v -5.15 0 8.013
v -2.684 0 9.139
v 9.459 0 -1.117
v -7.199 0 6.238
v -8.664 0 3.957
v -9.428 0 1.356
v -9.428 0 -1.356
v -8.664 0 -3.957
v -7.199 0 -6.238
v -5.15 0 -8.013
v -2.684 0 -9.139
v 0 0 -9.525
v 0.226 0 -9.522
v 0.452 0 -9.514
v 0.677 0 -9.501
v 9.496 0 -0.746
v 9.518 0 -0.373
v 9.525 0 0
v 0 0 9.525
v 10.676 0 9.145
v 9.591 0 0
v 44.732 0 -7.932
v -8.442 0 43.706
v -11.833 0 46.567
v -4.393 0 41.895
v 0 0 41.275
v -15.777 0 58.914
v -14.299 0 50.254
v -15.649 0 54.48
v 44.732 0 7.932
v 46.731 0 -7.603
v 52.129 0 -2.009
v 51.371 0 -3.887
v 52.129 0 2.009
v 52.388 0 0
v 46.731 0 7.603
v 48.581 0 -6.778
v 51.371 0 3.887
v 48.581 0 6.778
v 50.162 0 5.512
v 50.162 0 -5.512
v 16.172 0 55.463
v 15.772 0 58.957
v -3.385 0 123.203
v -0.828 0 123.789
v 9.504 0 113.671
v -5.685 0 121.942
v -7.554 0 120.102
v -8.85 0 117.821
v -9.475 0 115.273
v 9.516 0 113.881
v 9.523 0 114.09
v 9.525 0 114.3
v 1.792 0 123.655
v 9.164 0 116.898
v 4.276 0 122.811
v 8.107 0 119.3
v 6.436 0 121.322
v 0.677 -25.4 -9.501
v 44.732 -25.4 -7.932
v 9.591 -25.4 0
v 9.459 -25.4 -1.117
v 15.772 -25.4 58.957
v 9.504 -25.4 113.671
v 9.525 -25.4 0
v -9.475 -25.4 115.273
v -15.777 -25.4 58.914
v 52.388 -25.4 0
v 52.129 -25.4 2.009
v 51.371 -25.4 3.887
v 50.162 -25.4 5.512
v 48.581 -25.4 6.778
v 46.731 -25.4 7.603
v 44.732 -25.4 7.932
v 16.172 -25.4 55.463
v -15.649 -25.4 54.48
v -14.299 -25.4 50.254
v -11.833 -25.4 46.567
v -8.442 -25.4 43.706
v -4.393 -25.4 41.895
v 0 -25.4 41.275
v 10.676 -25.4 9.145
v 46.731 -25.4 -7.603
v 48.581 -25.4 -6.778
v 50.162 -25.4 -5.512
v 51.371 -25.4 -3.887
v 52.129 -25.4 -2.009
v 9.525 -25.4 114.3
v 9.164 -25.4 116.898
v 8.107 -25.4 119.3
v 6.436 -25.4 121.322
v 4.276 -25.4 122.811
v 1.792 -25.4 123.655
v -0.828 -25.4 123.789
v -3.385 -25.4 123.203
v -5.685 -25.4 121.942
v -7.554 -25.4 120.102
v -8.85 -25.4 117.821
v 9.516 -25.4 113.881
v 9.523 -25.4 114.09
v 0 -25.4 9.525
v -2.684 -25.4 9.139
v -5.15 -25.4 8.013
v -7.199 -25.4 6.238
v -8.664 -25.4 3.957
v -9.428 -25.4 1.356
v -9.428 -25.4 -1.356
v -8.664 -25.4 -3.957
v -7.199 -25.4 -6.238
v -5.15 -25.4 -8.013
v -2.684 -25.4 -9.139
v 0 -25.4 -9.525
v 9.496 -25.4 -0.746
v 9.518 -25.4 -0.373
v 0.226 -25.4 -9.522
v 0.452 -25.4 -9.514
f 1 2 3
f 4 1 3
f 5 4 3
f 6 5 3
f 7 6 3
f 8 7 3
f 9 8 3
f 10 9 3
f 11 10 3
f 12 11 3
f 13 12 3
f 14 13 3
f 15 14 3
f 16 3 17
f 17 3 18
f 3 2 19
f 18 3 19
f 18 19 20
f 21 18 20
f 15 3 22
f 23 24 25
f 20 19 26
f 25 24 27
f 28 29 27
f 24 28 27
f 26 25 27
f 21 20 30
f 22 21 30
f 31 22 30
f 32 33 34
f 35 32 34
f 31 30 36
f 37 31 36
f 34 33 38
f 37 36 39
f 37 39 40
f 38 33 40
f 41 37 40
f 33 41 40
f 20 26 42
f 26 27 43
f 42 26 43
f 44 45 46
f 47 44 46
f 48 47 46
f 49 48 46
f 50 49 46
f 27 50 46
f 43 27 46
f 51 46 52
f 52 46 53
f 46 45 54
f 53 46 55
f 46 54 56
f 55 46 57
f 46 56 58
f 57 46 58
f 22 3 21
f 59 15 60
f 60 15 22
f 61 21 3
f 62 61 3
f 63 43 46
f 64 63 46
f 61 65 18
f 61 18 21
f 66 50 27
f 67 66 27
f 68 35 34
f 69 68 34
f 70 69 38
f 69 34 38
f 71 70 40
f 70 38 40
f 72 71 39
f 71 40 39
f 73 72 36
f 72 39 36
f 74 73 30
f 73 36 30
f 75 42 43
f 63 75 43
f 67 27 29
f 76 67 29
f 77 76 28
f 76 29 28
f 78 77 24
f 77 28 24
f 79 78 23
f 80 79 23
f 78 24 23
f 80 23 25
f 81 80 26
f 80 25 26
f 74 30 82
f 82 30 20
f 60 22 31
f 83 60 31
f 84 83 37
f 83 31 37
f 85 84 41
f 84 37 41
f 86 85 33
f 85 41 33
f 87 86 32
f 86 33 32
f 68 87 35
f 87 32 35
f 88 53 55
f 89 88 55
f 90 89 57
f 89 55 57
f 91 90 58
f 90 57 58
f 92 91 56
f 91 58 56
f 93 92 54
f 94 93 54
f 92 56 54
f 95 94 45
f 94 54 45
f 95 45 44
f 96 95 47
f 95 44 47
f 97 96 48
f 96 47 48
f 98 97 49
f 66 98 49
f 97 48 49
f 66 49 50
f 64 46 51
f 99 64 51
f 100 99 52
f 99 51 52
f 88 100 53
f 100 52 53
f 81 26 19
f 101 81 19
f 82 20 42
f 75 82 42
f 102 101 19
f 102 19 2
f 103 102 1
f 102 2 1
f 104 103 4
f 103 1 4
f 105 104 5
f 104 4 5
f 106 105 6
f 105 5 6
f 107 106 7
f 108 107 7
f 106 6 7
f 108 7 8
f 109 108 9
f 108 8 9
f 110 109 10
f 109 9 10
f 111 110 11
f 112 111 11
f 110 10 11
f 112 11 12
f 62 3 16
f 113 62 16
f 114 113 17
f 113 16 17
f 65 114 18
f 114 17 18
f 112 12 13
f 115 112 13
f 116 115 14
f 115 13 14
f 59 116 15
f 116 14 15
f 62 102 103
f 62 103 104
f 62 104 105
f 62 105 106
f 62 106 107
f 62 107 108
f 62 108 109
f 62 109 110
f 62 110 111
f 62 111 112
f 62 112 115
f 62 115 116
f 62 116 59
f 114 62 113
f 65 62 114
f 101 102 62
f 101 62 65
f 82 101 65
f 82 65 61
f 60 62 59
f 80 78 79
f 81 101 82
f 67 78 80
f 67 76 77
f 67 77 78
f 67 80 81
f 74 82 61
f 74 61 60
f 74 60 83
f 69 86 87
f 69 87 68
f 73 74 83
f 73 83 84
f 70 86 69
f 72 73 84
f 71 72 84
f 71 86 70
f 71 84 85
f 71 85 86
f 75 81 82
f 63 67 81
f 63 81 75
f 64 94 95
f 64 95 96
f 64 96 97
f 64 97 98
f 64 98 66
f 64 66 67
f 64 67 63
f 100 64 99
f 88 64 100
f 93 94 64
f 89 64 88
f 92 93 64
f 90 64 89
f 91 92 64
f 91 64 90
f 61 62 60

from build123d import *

# Parameters (mm, degrees)
F1_DEPTH = 25.4
F2_DEPTH = 25.4


with BuildPart() as f1:
    # F0 (on Front) → F1 (new body)
    with BuildSketch(Plane.XZ):
        with BuildLine():
            Line((0, 0), (0, 9.525))
            ThreePointArc((0, 9.525), (-9.525, 0), (0, -9.525))
            Line((0, -9.525), (0.6773435479, -9.500885786))
            ThreePointArc((0.6773435479, -9.500885786), (6.5771572573, -6.8896028487), (9.4592491619, -1.117242271))
            ThreePointArc((9.4592491619, -1.117242271), (9.5085480823, -0.5595876752), (9.525, 0))
            Line((9.525, 0), (0, 0))
        make_face()
        with BuildLine():
            Line((0, 41.275), (0, 9.525))
            ThreePointArc((0, 9.525), (0.3388863295, 9.5189695375), (0.6773435479, 9.500885786))
            Line((0.6773435479, 9.500885786), (10.676261341, 9.1449127433))
            Line((10.676261341, 9.1449127433), (16.1720081428, 55.4634825416))
            Line((16.1720081428, 55.4634825416), (15.771858623, 58.9566822016))
            ThreePointArc((15.771858623, 58.9566822016), (15.8491936804, 58.0548119585), (15.875, 57.15))
            ThreePointArc((15.875, 57.15), (11.2253201513, 45.9246798487), (0, 41.275))
        make_face()
        with BuildLine():
            Line((0.6773435479, 9.500885786), (0, 9.525))
            Line((0, 9.525), (0, 0))
            Line((0, 0), (9.525, 0))
            ThreePointArc((9.525, 0), (6.9705567315, 6.4912990883), (0.6773435479, 9.500885786))
        make_face()
        with BuildLine():
            ThreePointArc((0.6773435479, 9.500885786), (0.3388863295, 9.5189695375), (0, 9.525))
            Line((0, 9.525), (0.6773435479, 9.500885786))
        make_face()
        with BuildLine():
            Line((0.6773435479, -9.500885786), (0, -9.525))
            ThreePointArc((0, -9.525), (0.3388863295, -9.5189695375), (0.6773435479, -9.500885786))
        make_face()
        with BuildLine():
            Line((10.676261341, 9.1449127433), (0.6773435479, 9.500885786))
            ThreePointArc((0.6773435479, 9.500885786), (6.9705567315, 6.4912990883), (9.525, 0))
            Line((9.525, 0), (9.5912078693, 0))
            Line((9.5912078693, 0), (10.676261341, 9.1449127433))
        make_face()
        with BuildLine():
            Line((0, 73.025), (0, 41.275))
            ThreePointArc((0, 41.275), (11.2253201513, 45.9246798487), (15.875, 57.15))
            ThreePointArc((15.875, 57.15), (15.8491936804, 58.0548119585), (15.771858623, 58.9566822016))
            ThreePointArc((15.771858623, 58.9566822016), (10.5672736562, 68.9968709993), (0, 73.025))
        make_face()
        with BuildLine():
            ThreePointArc((-15.7766896907, 58.9139975635), (-11.8325628315, 46.5667074197), (0, 41.275))
            Line((0, 41.275), (0, 73.025))
            ThreePointArc((0, 73.025), (-10.5832925803, 68.9825628315), (-15.7766896907, 58.9139975635))
        make_face()
        with BuildLine():
            ThreePointArc((9.4592491619, -1.117242271), (6.5771572573, -6.8896028487), (0.6773435479, -9.500885786))
            Line((0.6773435479, -9.500885786), (44.7324052746, -7.9324746146))
            ThreePointArc((44.7324052746, -7.9324746146), (38.9380895153, -5.7116327839), (36.5125, 0))
            Line((36.5125, 0), (9.5912078693, 0))
            Line((9.5912078693, 0), (9.4592491619, -1.117242271))
        make_face()
        with BuildLine():
            Line((44.7324052746, 7.9324746146), (10.676261341, 9.1449127433))
            Line((10.676261341, 9.1449127433), (9.5912078693, 0))
            Line((9.5912078693, 0), (36.5125, 0))
            ThreePointArc((36.5125, 0), (38.9380895153, 5.7116327839), (44.7324052746, 7.9324746146))
        make_face()
        with BuildLine():
            Line((-9.4751940083, 115.2727916044), (-15.7766896907, 58.9139975635))
            ThreePointArc((-15.7766896907, 58.9139975635), (-10.5832925803, 68.9825628315), (0, 73.025))
            Line((0, 73.025), (0, 104.775))
            ThreePointArc((0, 104.775), (-7.0707660487, 107.9180024691), (-9.4751940083, 115.2727916044))
        make_face()
        with BuildLine():
            Line((0, 104.775), (0, 73.025))
            ThreePointArc((0, 73.025), (10.5672736562, 68.9968709993), (15.771858623, 58.9566822016))
            Line((15.771858623, 58.9566822016), (9.5042343668, 113.6713871614))
            ThreePointArc((9.5042343668, 113.6713871614), (6.5091507784, 107.3461103587), (0, 104.775))
        make_face()
        with BuildLine():
            ThreePointArc((36.5125, 0), (38.9380895153, -5.7116327839), (44.7324052746, -7.9324746146))
            ThreePointArc((44.7324052746, -7.9324746146), (50.1616327839, -5.5119104847), (52.3875, 0))
            ThreePointArc((52.3875, 0), (50.1616327839, 5.5119104847), (44.7324052746, 7.9324746146))
            ThreePointArc((44.7324052746, 7.9324746146), (38.9380895153, 5.7116327839), (36.5125, 0))
        make_face()
        with BuildLine():
            ThreePointArc((9.525, 114.3), (0.4870328896, 123.8125403528), (-9.4751940083, 115.2727916044))
            ThreePointArc((-9.4751940083, 115.2727916044), (-7.0707660487, 107.9180024691), (0, 104.775))
            ThreePointArc((0, 104.775), (6.5091507784, 107.3461103587), (9.5042343668, 113.6713871614))
            ThreePointArc((9.5042343668, 113.6713871614), (9.5198071762, 113.9855221342), (9.525, 114.3))
        make_face()
    extrude(amount=F1_DEPTH)

    # F0 (on Front) → F2 (join)
    with BuildSketch(Plane.XZ):
        with BuildLine():
            Line((0, 0), (0, 9.525))
            ThreePointArc((0, 9.525), (-9.525, 0), (0, -9.525))
            Line((0, -9.525), (0.6773435479, -9.500885786))
            ThreePointArc((0.6773435479, -9.500885786), (6.5771572573, -6.8896028487), (9.4592491619, -1.117242271))
            ThreePointArc((9.4592491619, -1.117242271), (9.5085480823, -0.5595876752), (9.525, 0))
            Line((9.525, 0), (0, 0))
        make_face()
        with BuildLine():
            Line((0, 41.275), (0, 9.525))
            ThreePointArc((0, 9.525), (0.3388863295, 9.5189695375), (0.6773435479, 9.500885786))
            Line((0.6773435479, 9.500885786), (10.676261341, 9.1449127433))
            Line((10.676261341, 9.1449127433), (16.1720081428, 55.4634825416))
            Line((16.1720081428, 55.4634825416), (15.771858623, 58.9566822016))
            ThreePointArc((15.771858623, 58.9566822016), (15.8491936804, 58.0548119585), (15.875, 57.15))
            ThreePointArc((15.875, 57.15), (11.2253201513, 45.9246798487), (0, 41.275))
        make_face()
        with BuildLine():
            Line((0.6773435479, 9.500885786), (0, 9.525))
            Line((0, 9.525), (0, 0))
            Line((0, 0), (9.525, 0))
            ThreePointArc((9.525, 0), (6.9705567315, 6.4912990883), (0.6773435479, 9.500885786))
        make_face()
        with BuildLine():
            ThreePointArc((0.6773435479, 9.500885786), (0.3388863295, 9.5189695375), (0, 9.525))
            Line((0, 9.525), (0.6773435479, 9.500885786))
        make_face()
        with BuildLine():
            Line((0.6773435479, -9.500885786), (0, -9.525))
            ThreePointArc((0, -9.525), (0.3388863295, -9.5189695375), (0.6773435479, -9.500885786))
        make_face()
        with BuildLine():
            Line((10.676261341, 9.1449127433), (0.6773435479, 9.500885786))
            ThreePointArc((0.6773435479, 9.500885786), (6.9705567315, 6.4912990883), (9.525, 0))
            Line((9.525, 0), (9.5912078693, 0))
            Line((9.5912078693, 0), (10.676261341, 9.1449127433))
        make_face()
        with BuildLine():
            Line((0, 73.025), (0, 41.275))
            ThreePointArc((0, 41.275), (11.2253201513, 45.9246798487), (15.875, 57.15))
            ThreePointArc((15.875, 57.15), (15.8491936804, 58.0548119585), (15.771858623, 58.9566822016))
            ThreePointArc((15.771858623, 58.9566822016), (10.5672736562, 68.9968709993), (0, 73.025))
        make_face()
        with BuildLine():
            ThreePointArc((-15.7766896907, 58.9139975635), (-11.8325628315, 46.5667074197), (0, 41.275))
            Line((0, 41.275), (0, 73.025))
            ThreePointArc((0, 73.025), (-10.5832925803, 68.9825628315), (-15.7766896907, 58.9139975635))
        make_face()
        with BuildLine():
            ThreePointArc((9.4592491619, -1.117242271), (6.5771572573, -6.8896028487), (0.6773435479, -9.500885786))
            Line((0.6773435479, -9.500885786), (44.7324052746, -7.9324746146))
            ThreePointArc((44.7324052746, -7.9324746146), (38.9380895153, -5.7116327839), (36.5125, 0))
            Line((36.5125, 0), (9.5912078693, 0))
            Line((9.5912078693, 0), (9.4592491619, -1.117242271))
        make_face()
        with BuildLine():
            Line((44.7324052746, 7.9324746146), (10.676261341, 9.1449127433))
            Line((10.676261341, 9.1449127433), (9.5912078693, 0))
            Line((9.5912078693, 0), (36.5125, 0))
            ThreePointArc((36.5125, 0), (38.9380895153, 5.7116327839), (44.7324052746, 7.9324746146))
        make_face()
        with BuildLine():
            Line((-9.4751940083, 115.2727916044), (-15.7766896907, 58.9139975635))
            ThreePointArc((-15.7766896907, 58.9139975635), (-10.5832925803, 68.9825628315), (0, 73.025))
            Line((0, 73.025), (0, 104.775))
            ThreePointArc((0, 104.775), (-7.0707660487, 107.9180024691), (-9.4751940083, 115.2727916044))
        make_face()
        with BuildLine():
            Line((0, 104.775), (0, 73.025))
            ThreePointArc((0, 73.025), (10.5672736562, 68.9968709993), (15.771858623, 58.9566822016))
            Line((15.771858623, 58.9566822016), (9.5042343668, 113.6713871614))
            ThreePointArc((9.5042343668, 113.6713871614), (6.5091507784, 107.3461103587), (0, 104.775))
        make_face()
        with BuildLine():
            ThreePointArc((36.5125, 0), (38.9380895153, -5.7116327839), (44.7324052746, -7.9324746146))
            ThreePointArc((44.7324052746, -7.9324746146), (50.1616327839, -5.5119104847), (52.3875, 0))
            ThreePointArc((52.3875, 0), (50.1616327839, 5.5119104847), (44.7324052746, 7.9324746146))
            ThreePointArc((44.7324052746, 7.9324746146), (38.9380895153, 5.7116327839), (36.5125, 0))
        make_face()
        with BuildLine():
            ThreePointArc((9.525, 114.3), (0.4870328896, 123.8125403528), (-9.4751940083, 115.2727916044))
            ThreePointArc((-9.4751940083, 115.2727916044), (-7.0707660487, 107.9180024691), (0, 104.775))
            ThreePointArc((0, 104.775), (6.5091507784, 107.3461103587), (9.5042343668, 113.6713871614))
            ThreePointArc((9.5042343668, 113.6713871614), (9.5198071762, 113.9855221342), (9.525, 114.3))
        make_face()
    extrude(amount=F2_DEPTH)


solid = f1.part
